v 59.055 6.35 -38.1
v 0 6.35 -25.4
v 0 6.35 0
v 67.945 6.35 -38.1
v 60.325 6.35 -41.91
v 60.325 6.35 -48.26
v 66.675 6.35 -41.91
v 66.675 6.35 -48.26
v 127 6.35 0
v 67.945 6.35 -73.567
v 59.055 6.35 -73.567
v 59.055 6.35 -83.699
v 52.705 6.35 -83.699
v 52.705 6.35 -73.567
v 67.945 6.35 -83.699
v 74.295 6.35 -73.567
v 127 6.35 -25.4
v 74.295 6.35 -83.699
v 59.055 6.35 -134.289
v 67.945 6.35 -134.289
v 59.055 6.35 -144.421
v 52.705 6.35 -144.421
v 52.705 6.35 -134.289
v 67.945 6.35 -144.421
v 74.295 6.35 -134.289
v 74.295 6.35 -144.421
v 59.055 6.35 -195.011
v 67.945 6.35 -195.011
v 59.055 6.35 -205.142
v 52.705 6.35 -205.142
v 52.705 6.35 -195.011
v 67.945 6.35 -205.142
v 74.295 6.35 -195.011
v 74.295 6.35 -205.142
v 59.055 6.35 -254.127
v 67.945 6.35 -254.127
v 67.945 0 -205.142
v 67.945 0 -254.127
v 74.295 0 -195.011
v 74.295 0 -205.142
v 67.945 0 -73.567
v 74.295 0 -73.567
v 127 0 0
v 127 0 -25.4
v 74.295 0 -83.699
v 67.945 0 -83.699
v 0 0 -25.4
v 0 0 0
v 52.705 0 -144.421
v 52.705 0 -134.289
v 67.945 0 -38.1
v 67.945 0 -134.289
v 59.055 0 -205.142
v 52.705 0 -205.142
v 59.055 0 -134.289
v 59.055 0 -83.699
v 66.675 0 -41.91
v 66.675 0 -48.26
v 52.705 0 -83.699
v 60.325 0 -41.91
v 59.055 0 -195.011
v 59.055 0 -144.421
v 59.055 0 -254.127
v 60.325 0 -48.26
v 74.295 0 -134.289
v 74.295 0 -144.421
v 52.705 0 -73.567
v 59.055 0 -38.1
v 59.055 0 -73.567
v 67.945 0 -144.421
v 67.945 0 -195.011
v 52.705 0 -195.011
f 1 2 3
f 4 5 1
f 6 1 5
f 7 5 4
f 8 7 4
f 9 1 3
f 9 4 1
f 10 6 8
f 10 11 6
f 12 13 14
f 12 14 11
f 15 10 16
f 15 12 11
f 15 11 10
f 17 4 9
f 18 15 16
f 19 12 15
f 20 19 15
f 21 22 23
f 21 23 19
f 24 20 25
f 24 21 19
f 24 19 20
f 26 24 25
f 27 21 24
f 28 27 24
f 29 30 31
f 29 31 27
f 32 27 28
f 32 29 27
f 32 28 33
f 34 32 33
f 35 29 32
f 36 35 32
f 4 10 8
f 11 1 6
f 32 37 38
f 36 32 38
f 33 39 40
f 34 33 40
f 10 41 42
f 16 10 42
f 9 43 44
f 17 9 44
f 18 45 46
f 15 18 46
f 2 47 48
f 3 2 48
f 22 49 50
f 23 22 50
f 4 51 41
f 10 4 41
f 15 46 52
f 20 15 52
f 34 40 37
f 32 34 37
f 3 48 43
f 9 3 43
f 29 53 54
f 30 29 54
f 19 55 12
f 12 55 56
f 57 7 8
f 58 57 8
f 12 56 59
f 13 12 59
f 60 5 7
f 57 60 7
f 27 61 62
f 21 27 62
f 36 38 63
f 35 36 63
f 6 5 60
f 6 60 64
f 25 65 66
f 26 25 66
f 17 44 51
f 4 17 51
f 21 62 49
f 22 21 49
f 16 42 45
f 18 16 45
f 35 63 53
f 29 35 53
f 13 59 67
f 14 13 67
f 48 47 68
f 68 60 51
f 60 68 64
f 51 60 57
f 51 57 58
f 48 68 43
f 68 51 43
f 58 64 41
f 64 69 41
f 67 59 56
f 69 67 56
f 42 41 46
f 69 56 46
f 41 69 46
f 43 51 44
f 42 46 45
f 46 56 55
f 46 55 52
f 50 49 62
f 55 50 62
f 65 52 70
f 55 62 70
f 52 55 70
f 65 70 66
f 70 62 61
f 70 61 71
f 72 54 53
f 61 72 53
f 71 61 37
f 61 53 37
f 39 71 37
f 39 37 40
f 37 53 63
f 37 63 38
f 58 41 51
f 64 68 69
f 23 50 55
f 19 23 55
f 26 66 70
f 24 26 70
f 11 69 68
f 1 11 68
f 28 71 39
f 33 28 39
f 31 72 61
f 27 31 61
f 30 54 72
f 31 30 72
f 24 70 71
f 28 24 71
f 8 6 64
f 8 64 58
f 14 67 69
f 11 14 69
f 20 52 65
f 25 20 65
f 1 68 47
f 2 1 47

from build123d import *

# Parameters (mm, degrees)
SKETCH1_W           = 6.35
SKETCH1_H           = 6.35
BOSS_EXTRUDE2_DEPTH = 6.35


with BuildPart() as part:
    # Sketch1 → Boss-Extrude2 (new body)
    with BuildSketch(Plane(origin=(0, 0, 0), x_dir=(1, 0, 0), z_dir=(0, 1, 0))):
        Polygon((0, 0), (127, 0), (127, 25.4), (67.945, 38.1), (67.945, 73.566782), (74.295, 73.566782), (74.295, 83.698651246), (67.945, 83.698651246), (67.945, 134.288657), (74.295, 134.288657), (74.295, 144.420526246), (67.945, 144.420526246), (67.945, 195.010544446), (74.295, 195.010544446), (74.295, 205.142413692), (67.945, 205.142413692), (67.945, 254.126831852), (59.055, 254.126831852), (59.055, 205.142413692), (52.705, 205.142413692), (52.705, 195.010544446), (59.055, 195.010544446), (59.055, 144.420526246), (52.705, 144.420526246), (52.705, 134.288657), (59.055, 134.288657), (59.055, 83.698651246), (52.705, 83.698651246), (52.705, 73.566782), (59.055, 73.566782), (59.055, 38.1), (0, 25.4), align=None)
        with Locations((63.5, 45.085)):
            Rectangle(SKETCH1_W, SKETCH1_H, mode=Mode.SUBTRACT)
    extrude(amount=BOSS_EXTRUDE2_DEPTH)


solid = part.part
